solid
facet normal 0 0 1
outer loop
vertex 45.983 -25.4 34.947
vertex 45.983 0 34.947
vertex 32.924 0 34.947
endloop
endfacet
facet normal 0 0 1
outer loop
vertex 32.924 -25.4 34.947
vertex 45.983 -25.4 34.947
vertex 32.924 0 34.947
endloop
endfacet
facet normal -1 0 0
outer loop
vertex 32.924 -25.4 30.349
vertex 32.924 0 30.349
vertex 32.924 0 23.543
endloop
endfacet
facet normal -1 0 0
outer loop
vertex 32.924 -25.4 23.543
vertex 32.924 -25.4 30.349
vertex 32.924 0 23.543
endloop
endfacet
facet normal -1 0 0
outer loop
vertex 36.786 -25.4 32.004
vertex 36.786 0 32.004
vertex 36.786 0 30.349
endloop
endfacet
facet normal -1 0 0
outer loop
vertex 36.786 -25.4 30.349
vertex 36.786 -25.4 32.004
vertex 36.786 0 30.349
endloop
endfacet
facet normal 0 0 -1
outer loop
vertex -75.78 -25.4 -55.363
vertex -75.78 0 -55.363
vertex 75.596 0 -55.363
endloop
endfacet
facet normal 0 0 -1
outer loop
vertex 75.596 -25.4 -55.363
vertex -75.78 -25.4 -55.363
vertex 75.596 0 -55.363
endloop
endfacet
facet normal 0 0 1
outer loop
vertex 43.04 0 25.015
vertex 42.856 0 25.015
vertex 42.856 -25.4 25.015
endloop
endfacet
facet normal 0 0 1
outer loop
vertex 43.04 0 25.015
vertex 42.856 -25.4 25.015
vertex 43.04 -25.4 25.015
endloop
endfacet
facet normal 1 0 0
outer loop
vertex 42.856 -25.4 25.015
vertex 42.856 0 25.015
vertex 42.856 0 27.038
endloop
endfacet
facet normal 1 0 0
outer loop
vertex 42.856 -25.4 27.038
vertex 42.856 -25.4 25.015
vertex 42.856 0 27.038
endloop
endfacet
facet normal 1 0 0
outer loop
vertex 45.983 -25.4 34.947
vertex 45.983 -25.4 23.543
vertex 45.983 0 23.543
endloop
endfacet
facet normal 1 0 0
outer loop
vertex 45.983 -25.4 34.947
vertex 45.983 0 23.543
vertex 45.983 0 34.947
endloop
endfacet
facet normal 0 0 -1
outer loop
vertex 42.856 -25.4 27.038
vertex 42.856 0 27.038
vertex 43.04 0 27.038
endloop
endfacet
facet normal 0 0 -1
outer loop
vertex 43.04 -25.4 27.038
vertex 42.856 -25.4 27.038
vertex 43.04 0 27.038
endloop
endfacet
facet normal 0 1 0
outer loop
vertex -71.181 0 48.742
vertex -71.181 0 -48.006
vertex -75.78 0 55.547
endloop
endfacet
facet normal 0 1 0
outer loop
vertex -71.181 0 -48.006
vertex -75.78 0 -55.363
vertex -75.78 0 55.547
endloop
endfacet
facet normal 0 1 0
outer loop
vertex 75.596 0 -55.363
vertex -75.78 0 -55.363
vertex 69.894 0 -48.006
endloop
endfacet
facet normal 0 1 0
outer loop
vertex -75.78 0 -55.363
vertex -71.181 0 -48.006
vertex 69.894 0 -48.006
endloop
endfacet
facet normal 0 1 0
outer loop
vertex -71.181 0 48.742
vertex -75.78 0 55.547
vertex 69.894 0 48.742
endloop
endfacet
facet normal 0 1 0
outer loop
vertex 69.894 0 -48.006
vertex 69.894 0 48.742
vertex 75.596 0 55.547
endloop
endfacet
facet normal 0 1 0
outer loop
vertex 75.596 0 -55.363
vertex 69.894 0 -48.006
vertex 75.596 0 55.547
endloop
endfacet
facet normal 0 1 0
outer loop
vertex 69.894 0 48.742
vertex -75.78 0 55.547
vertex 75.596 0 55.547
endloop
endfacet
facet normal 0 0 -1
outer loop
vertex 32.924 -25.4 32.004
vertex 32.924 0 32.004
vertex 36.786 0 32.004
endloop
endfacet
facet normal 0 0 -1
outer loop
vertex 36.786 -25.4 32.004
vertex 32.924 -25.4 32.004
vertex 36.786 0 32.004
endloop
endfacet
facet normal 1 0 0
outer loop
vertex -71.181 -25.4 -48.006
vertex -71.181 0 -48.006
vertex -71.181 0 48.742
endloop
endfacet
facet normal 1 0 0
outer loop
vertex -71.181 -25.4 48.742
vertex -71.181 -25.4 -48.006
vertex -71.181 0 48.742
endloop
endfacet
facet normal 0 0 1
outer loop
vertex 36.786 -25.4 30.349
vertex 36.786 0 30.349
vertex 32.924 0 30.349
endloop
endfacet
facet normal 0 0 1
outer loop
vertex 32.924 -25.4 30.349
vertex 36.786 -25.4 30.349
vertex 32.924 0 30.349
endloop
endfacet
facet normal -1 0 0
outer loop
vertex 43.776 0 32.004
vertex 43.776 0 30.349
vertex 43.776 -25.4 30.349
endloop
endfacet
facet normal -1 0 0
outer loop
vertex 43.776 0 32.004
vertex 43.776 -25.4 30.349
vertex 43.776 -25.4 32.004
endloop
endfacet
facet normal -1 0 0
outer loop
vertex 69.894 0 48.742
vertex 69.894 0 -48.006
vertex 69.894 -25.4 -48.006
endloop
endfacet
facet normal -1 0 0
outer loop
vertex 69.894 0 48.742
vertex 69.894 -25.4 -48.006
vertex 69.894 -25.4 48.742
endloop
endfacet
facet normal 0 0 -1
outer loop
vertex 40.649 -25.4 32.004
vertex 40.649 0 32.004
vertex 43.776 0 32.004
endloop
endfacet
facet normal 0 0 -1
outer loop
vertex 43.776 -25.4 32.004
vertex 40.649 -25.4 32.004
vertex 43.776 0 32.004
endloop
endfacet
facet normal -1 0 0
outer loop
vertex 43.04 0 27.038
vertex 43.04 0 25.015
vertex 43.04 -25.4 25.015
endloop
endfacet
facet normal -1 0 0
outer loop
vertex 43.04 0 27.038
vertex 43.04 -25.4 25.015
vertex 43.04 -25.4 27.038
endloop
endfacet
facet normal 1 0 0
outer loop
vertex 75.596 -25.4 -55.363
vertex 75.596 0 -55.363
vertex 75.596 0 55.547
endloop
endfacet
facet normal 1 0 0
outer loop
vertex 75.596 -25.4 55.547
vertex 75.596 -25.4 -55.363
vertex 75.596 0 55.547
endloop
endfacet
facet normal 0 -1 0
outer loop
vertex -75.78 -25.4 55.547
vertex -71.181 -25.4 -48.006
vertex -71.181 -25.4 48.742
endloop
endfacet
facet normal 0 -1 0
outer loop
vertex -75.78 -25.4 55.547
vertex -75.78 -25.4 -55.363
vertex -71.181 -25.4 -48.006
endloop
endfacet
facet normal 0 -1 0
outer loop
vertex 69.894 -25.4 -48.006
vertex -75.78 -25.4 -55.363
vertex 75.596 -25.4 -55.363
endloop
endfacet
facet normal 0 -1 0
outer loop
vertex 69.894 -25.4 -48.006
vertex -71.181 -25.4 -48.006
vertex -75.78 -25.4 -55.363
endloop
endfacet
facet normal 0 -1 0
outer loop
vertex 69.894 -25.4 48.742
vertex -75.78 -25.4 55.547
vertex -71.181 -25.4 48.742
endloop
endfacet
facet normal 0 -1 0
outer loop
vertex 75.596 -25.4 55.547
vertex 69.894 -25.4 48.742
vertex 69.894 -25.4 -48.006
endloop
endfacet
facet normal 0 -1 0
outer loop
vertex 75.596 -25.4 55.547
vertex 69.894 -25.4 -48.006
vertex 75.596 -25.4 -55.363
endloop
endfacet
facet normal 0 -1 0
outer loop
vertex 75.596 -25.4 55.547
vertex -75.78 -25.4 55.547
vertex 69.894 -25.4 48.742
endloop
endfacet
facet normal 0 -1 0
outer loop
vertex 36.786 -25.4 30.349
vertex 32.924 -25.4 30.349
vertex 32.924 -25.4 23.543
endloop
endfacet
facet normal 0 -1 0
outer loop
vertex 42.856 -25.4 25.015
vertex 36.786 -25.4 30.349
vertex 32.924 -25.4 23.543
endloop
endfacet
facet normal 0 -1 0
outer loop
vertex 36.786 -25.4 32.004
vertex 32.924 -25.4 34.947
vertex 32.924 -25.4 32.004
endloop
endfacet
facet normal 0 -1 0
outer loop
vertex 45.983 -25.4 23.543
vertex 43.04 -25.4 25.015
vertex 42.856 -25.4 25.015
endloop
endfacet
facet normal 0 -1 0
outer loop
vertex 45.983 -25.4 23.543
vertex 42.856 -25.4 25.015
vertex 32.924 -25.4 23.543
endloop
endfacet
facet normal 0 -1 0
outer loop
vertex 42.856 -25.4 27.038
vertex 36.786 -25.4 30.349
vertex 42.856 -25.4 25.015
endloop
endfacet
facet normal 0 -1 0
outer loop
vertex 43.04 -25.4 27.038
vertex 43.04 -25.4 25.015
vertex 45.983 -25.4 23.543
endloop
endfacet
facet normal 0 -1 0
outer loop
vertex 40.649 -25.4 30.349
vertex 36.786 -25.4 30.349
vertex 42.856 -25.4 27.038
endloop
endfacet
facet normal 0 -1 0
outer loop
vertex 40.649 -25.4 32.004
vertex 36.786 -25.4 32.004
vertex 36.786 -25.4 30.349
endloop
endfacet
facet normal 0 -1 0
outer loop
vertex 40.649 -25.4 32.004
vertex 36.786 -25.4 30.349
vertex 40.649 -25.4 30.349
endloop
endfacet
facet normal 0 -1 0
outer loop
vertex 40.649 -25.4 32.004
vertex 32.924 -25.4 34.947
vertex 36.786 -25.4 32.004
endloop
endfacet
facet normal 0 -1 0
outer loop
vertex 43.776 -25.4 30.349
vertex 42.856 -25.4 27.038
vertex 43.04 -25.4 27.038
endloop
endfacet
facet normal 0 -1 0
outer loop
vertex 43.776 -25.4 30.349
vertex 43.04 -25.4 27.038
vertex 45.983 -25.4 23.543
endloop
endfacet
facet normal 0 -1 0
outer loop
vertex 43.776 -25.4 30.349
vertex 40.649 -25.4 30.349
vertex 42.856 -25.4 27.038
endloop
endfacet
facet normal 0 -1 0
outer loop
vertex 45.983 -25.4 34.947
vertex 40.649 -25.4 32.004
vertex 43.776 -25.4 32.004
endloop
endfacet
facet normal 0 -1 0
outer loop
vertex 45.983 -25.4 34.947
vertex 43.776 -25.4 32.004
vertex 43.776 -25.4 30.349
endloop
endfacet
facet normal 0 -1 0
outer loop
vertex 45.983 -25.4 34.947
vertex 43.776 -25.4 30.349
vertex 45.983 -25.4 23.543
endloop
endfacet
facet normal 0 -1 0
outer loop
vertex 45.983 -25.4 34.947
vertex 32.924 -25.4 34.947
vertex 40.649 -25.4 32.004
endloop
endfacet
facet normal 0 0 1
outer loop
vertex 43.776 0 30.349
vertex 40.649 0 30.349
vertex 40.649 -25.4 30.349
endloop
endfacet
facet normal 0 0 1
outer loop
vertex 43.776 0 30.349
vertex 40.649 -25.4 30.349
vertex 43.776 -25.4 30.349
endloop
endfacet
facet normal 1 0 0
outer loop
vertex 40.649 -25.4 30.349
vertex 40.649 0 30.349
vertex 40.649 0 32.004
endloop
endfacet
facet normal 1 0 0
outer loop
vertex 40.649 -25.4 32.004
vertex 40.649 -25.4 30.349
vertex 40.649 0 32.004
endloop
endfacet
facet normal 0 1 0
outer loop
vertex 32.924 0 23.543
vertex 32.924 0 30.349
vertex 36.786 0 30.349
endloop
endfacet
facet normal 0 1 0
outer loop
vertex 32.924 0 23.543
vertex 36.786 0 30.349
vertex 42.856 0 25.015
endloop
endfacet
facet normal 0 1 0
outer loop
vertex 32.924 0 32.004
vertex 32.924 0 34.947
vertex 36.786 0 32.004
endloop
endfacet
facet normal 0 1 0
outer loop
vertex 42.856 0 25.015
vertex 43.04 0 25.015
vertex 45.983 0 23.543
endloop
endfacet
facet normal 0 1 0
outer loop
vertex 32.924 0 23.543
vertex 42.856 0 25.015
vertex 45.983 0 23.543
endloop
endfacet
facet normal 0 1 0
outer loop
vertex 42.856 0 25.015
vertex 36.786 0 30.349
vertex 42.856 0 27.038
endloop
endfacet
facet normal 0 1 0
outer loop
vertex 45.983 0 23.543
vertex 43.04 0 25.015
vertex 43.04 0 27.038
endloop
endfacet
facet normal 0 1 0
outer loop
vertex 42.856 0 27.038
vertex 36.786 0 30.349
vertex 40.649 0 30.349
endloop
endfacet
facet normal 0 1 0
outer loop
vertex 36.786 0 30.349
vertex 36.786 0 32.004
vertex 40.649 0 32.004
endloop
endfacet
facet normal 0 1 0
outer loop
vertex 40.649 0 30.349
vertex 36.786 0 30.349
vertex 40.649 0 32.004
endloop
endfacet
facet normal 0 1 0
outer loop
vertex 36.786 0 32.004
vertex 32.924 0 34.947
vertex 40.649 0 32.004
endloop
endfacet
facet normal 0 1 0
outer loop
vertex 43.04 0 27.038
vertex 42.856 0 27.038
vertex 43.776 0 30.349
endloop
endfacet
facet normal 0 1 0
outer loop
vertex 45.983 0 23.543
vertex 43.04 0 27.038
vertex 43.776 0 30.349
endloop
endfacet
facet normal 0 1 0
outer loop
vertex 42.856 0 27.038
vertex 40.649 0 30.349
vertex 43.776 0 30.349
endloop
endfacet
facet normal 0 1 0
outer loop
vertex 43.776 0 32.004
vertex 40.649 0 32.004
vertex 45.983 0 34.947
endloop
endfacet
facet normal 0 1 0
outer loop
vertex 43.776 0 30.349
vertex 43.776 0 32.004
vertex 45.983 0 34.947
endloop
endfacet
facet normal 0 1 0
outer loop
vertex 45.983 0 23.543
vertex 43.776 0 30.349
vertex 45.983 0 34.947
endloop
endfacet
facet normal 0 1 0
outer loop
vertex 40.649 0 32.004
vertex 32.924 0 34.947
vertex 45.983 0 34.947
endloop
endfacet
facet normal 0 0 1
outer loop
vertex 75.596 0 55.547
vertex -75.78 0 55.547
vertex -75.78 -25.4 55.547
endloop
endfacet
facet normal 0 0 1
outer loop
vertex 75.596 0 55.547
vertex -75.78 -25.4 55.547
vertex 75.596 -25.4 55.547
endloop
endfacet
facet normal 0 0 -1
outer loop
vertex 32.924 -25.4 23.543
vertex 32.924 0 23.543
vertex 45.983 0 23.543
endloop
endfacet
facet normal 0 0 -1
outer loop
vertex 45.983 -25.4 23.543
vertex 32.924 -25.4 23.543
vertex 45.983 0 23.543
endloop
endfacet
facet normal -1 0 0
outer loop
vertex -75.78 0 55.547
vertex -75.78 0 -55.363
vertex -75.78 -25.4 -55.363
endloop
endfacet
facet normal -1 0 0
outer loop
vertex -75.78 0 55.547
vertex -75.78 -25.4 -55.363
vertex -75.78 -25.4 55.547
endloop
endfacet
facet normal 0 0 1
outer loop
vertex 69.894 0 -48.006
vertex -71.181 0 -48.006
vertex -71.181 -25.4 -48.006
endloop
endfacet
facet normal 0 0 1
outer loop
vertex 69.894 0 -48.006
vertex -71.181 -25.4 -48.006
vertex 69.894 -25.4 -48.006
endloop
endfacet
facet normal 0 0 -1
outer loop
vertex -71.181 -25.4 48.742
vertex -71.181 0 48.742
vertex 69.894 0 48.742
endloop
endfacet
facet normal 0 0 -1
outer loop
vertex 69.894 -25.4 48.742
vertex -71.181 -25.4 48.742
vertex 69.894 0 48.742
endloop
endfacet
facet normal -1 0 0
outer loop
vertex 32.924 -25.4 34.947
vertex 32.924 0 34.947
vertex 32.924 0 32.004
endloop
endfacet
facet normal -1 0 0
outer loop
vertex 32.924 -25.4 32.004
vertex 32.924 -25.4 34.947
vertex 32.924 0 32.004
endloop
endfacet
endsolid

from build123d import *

# Parameters (mm, degrees)
F0_W     = 151.375249
F0_H     = 110.910412
F0_W_2   = 141.075112
F0_H_2   = 96.747726
F1_DEPTH = 25.4
F2_W     = 0.183932
F2_H     = 2.023243
F2_W_2   = 3.12683
F2_H_2   = 1.655381
F3_DEPTH = 25.4


with BuildPart() as f1:
    # F0 (on Front) → F1 (new body)
    with BuildSketch(Plane.XZ):
        with Locations((-0.091963, 0.091964)):
            Rectangle(F0_W, F0_H)
        with Locations((-0.643756, 0.367861)):
            Rectangle(F0_W_2, F0_H_2, mode=Mode.SUBTRACT)
    extrude(amount=F1_DEPTH)


with BuildPart() as f3:
    # F2 (on Front) → F3 (new body)
    with BuildSketch(Plane.XZ):
        Polygon((32.923657, 23.543173), (45.982759, 23.543173), (45.982759, 34.946896), (32.923657, 34.946896), (32.923657, 32.004002), (36.786206, 32.004002), (36.786206, 30.348621), (32.923657, 30.348621), align=None)
        with Locations((42.947896, 26.026241)):
            Rectangle(F2_W, F2_H, mode=Mode.SUBTRACT)
        with Locations((42.212173, 31.176311)):
            Rectangle(F2_W_2, F2_H_2, mode=Mode.SUBTRACT)
    extrude(amount=F3_DEPTH)


solid = Compound([f1.part, f3.part])
